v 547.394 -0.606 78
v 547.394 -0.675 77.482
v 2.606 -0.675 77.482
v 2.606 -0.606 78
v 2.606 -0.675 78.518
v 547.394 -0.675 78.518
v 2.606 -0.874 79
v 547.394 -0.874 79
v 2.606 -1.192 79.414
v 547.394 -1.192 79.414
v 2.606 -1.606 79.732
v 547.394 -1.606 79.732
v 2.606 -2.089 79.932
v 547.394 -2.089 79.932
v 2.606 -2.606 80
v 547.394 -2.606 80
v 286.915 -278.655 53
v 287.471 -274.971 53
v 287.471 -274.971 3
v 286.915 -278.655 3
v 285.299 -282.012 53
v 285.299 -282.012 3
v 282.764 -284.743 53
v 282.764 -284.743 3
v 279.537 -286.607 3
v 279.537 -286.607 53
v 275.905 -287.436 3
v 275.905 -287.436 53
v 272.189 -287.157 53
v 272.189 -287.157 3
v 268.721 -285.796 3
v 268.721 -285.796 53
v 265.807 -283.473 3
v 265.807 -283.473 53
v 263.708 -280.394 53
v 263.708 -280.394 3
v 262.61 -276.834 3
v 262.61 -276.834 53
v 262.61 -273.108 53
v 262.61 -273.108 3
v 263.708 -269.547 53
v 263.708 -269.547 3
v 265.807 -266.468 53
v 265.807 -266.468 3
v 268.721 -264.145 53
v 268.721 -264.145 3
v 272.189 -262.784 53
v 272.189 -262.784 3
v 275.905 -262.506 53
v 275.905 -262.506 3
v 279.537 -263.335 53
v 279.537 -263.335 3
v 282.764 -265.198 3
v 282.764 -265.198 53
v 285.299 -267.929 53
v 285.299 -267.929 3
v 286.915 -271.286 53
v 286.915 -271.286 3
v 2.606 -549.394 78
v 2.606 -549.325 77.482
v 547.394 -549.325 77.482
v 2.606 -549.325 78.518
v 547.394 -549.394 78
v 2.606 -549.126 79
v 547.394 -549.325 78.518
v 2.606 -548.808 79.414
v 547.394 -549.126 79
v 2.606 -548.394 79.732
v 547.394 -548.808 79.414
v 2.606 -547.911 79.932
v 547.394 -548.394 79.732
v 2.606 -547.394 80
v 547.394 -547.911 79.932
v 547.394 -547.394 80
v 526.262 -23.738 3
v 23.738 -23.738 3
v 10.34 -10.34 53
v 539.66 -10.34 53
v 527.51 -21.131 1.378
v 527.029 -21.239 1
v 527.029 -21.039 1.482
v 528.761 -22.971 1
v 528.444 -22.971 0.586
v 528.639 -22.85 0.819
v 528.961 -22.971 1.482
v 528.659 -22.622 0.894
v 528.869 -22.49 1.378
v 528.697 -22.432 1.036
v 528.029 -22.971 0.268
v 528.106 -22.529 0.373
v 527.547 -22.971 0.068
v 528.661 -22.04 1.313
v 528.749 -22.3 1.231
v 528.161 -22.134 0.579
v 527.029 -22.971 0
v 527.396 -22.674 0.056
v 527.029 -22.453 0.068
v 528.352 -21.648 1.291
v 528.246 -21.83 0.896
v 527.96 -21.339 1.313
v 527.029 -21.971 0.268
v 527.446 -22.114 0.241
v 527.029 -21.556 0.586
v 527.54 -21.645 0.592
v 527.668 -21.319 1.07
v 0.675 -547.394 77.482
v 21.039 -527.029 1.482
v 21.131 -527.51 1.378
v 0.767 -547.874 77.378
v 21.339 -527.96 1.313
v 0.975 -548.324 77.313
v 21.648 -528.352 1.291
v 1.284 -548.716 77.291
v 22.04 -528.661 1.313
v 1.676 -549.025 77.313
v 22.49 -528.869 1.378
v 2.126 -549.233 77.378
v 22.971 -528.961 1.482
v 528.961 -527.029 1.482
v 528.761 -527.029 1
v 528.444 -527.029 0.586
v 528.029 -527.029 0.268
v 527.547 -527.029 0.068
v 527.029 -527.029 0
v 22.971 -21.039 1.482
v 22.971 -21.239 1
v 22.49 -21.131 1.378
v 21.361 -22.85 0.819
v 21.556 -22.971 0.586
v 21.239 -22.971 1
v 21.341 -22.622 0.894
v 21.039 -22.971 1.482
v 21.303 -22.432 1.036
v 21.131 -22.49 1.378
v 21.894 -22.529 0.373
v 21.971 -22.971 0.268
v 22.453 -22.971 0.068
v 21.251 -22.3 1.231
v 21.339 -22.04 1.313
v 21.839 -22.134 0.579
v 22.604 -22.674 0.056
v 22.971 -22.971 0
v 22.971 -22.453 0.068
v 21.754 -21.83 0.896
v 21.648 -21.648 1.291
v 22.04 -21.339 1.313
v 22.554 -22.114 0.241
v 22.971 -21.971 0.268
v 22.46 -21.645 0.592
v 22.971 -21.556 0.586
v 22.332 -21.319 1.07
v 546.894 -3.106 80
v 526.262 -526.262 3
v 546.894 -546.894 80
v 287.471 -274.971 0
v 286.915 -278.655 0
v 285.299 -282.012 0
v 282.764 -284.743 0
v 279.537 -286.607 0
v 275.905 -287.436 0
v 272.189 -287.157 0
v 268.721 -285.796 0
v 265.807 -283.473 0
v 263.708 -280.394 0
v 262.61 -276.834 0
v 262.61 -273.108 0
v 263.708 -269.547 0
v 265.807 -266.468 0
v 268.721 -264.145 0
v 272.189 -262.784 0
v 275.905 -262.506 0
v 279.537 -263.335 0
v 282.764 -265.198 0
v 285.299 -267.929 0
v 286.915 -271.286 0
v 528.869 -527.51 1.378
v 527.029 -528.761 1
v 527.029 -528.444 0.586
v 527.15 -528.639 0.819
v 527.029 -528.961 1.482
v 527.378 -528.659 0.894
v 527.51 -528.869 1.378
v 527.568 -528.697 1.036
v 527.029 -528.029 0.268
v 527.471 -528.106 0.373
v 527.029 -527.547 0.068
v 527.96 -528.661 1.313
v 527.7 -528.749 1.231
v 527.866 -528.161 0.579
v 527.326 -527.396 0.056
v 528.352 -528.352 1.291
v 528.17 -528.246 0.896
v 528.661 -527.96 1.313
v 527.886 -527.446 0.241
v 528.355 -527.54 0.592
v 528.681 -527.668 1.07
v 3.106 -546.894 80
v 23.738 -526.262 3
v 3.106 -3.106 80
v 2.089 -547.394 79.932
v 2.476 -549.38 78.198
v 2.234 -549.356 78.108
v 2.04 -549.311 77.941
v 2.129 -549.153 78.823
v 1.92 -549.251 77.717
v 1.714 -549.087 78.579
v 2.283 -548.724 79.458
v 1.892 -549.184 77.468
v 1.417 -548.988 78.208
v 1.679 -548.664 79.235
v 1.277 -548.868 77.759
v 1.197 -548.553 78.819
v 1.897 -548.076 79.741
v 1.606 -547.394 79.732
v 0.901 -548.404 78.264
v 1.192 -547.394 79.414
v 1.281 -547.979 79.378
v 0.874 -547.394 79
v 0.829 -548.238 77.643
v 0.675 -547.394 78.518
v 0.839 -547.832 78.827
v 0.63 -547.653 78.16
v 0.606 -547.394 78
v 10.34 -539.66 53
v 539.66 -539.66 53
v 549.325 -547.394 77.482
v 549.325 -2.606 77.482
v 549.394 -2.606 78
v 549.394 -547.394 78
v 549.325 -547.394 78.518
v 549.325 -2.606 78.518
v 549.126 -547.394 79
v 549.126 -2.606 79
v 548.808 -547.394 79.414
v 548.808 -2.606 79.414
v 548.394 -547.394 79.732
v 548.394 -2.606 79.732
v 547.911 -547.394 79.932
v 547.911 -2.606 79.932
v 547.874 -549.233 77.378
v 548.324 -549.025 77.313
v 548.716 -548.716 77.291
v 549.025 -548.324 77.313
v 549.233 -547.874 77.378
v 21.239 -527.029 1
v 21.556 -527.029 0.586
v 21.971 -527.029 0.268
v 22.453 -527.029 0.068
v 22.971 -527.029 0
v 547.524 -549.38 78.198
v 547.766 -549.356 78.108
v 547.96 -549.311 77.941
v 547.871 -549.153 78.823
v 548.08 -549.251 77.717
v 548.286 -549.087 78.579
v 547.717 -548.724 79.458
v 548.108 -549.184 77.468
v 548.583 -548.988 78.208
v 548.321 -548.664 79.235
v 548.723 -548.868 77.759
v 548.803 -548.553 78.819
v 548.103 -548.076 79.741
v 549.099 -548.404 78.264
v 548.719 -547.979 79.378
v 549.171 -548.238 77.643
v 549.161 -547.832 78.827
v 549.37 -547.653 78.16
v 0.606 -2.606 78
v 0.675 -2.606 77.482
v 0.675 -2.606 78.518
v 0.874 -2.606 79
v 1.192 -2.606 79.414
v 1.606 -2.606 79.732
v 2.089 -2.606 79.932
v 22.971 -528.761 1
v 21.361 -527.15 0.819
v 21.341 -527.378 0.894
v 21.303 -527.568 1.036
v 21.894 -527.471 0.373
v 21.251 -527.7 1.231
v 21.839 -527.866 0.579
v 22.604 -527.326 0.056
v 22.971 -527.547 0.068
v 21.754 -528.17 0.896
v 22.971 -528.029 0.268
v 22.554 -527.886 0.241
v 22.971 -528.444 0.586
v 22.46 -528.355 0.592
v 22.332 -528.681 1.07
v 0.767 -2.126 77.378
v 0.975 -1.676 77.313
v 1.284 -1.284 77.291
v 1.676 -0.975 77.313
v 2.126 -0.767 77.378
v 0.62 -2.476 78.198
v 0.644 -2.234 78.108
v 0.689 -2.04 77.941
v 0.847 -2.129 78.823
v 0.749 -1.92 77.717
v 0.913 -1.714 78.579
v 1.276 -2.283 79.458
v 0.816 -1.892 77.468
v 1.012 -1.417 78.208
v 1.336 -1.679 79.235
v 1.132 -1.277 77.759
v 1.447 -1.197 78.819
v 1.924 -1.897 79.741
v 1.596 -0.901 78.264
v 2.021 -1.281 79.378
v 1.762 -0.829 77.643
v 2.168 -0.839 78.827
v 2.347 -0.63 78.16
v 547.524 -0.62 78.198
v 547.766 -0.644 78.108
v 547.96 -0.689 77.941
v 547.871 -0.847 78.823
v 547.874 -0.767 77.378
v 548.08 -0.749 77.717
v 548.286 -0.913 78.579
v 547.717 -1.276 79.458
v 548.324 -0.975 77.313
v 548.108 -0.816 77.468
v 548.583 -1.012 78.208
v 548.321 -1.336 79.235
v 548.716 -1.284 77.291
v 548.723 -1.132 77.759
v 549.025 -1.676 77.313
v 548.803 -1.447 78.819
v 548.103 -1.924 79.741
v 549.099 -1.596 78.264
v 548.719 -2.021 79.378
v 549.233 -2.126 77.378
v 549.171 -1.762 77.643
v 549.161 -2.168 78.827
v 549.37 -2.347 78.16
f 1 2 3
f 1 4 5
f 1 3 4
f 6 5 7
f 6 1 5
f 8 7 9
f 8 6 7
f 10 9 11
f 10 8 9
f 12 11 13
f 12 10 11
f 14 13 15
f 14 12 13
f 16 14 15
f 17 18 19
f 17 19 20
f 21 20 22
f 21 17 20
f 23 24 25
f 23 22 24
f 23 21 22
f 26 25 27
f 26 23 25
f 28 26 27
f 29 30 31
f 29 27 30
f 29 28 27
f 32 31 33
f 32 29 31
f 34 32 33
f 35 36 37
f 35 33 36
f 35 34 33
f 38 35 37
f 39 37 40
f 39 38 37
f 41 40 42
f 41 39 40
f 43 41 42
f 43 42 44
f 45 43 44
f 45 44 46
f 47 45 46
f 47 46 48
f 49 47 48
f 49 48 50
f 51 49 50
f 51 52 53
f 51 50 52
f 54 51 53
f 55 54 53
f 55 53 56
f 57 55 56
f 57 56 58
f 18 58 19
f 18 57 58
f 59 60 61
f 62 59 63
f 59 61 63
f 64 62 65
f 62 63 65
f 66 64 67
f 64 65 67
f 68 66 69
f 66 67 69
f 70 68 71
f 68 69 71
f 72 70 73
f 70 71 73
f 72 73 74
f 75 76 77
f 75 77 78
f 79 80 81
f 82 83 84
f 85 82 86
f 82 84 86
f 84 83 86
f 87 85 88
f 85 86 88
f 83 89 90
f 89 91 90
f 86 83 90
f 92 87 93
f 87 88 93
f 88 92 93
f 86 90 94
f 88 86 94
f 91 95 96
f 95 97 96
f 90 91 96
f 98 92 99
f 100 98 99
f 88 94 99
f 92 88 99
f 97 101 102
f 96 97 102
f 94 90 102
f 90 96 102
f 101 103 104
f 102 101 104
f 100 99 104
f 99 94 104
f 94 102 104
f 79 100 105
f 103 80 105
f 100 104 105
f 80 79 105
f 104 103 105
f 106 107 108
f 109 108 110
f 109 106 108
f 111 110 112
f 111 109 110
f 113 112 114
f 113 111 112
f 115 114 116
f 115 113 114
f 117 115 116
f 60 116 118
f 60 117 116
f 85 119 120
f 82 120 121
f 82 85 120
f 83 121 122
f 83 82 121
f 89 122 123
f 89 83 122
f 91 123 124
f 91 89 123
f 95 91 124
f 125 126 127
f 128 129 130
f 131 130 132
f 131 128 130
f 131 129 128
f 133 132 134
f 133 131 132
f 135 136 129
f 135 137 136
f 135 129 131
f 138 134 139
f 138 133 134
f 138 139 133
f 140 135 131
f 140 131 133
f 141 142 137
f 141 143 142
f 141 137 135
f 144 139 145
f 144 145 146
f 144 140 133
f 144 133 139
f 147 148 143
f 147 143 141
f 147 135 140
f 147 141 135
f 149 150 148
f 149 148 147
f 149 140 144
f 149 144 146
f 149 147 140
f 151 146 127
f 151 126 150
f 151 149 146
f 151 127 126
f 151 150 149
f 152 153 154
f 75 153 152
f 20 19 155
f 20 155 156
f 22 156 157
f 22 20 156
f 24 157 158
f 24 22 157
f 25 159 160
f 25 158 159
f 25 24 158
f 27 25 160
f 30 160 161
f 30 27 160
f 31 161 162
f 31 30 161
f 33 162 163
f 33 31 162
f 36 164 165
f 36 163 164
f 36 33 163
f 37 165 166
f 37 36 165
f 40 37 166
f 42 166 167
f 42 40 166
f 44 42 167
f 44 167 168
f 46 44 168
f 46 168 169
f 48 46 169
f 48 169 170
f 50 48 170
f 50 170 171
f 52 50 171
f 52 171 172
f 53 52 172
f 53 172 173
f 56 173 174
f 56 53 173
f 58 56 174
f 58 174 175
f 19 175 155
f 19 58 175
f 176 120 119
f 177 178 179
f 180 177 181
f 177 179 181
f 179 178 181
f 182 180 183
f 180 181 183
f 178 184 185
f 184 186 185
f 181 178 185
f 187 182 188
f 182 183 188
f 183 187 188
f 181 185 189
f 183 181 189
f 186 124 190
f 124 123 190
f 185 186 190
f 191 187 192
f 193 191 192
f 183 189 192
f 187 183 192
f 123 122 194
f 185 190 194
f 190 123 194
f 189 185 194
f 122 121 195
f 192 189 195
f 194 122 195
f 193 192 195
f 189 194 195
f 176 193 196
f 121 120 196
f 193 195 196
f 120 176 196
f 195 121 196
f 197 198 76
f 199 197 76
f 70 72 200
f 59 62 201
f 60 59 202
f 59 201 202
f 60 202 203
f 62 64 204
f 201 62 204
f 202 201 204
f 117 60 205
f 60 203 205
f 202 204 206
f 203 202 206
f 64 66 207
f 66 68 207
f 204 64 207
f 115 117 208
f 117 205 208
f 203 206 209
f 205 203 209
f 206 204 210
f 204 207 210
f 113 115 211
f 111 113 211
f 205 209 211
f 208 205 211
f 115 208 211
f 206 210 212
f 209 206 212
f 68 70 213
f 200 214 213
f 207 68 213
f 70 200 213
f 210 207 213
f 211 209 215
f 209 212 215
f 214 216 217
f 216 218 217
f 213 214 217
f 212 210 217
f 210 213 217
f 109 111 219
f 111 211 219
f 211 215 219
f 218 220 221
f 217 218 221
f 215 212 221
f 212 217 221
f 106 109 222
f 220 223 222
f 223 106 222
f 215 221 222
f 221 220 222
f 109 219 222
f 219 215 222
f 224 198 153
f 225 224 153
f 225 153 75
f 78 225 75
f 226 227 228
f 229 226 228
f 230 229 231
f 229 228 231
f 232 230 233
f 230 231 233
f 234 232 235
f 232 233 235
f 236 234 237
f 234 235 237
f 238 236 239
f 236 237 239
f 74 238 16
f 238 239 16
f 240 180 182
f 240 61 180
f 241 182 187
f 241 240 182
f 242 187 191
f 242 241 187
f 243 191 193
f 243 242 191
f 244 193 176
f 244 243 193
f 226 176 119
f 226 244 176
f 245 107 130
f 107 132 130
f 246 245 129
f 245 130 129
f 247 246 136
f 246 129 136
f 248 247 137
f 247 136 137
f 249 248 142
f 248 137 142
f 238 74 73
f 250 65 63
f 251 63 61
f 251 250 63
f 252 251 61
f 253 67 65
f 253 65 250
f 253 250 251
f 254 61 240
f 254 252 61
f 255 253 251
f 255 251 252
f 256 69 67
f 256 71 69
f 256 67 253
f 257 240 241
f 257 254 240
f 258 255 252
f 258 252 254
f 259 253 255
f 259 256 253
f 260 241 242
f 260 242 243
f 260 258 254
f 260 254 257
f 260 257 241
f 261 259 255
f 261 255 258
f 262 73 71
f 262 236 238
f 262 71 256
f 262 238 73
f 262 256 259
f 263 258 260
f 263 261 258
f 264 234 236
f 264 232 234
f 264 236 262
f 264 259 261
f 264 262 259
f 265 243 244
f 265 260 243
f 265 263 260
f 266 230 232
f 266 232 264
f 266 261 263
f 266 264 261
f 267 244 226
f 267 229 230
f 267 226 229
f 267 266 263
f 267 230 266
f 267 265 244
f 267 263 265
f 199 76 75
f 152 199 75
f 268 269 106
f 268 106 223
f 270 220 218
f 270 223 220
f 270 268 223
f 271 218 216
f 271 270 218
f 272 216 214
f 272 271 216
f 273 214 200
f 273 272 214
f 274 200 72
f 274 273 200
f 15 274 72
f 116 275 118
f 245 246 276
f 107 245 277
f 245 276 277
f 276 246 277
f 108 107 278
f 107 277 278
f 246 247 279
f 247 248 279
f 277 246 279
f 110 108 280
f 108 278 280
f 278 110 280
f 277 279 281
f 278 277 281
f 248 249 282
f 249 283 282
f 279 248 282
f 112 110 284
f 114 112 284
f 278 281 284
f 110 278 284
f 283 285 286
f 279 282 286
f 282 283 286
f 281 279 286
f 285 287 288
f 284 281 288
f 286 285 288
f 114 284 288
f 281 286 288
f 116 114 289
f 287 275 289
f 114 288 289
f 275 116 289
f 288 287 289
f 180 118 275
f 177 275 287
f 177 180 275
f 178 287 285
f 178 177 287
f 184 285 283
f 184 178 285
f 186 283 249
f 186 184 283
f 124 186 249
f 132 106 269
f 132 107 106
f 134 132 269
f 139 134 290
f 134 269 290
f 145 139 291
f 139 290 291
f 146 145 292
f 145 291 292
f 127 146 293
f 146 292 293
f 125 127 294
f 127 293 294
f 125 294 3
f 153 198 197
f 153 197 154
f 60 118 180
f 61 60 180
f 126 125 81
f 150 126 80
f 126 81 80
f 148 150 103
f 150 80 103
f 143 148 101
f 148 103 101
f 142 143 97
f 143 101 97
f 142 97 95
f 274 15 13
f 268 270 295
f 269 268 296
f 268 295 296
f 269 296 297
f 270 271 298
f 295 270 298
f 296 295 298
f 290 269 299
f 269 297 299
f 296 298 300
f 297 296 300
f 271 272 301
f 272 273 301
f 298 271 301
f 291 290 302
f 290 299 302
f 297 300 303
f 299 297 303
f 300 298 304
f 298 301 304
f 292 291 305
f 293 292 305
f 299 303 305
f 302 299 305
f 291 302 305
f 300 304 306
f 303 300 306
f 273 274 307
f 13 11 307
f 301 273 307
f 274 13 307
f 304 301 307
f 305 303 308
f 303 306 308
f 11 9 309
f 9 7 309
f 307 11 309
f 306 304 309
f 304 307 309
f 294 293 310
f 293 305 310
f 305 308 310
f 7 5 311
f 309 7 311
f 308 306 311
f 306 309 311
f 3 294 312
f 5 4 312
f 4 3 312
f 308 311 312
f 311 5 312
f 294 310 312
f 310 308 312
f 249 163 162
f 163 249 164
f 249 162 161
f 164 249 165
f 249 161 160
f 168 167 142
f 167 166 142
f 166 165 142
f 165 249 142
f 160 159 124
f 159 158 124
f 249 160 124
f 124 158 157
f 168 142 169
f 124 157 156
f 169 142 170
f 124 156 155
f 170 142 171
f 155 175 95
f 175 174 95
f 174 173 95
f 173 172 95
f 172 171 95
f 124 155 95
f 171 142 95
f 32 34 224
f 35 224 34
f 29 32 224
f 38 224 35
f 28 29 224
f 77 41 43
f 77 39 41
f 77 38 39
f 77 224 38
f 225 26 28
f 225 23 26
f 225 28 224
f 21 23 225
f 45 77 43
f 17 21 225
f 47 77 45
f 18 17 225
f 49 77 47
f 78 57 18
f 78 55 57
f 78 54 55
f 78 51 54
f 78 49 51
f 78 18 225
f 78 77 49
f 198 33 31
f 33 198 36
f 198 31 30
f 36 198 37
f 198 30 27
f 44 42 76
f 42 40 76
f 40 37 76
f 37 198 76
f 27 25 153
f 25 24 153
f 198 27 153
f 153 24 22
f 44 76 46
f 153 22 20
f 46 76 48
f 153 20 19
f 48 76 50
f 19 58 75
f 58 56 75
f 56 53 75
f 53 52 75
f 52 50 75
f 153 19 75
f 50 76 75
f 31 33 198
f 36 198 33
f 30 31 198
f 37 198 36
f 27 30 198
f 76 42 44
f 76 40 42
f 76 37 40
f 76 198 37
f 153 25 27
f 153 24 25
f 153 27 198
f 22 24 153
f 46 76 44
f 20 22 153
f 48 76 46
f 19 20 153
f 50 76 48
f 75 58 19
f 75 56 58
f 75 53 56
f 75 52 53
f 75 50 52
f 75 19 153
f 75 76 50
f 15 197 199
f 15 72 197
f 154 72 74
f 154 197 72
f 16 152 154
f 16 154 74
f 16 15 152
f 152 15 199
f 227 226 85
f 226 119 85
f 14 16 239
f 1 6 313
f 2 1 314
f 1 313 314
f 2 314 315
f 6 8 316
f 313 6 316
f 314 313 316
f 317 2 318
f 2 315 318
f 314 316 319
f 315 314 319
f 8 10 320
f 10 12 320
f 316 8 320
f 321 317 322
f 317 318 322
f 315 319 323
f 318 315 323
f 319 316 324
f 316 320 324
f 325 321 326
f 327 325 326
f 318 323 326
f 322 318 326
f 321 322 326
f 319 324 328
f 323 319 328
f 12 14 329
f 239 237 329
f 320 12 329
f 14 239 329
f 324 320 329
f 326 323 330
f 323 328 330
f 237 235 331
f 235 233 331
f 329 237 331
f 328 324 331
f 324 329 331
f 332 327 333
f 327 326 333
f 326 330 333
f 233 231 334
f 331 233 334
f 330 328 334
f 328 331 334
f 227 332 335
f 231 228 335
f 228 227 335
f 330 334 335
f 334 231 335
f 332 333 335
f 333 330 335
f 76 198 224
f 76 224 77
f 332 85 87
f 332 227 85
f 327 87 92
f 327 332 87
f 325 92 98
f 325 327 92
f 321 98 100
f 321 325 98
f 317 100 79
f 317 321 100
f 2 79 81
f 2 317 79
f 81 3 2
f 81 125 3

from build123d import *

# Parameters (mm, degrees)
SKETCH_1_W               = 550
SKETCH_1_H               = 550
EXTRUDE_1_DEPTH          = 80
DRAFT_3_ANGLE            = -15
FILLET_1_R               = 2
SHELL_8_OUTLINE_W        = 502.524167284
SHELL_8_OUTLINE_H        = 502.524167284
SHELL_8_DEPTH            = 77
SHELL_8_DRAFT            = -15
SKETCH_4_W               = 502.524167284
SKETCH_4_H               = 502.524167284
EXTRUDE_3_DEPTH          = 50
EXTRUDE_3_DRAFT          = -15
CUT_EXTRUDE_1_DEPTH      = 782.067566811
CUT_EXTRUDE_1_DEPTH_BACK = 782.067566811
SKETCH_5_R               = 12.5


# Read off the part's stored shape, not the designer's step: 쉘8
with BuildPart() as part:
    # 스케치1 → 보스-돌출1 (new body)
    with BuildSketch(Plane.XY):
        with Locations((275, -275)):
            Rectangle(SKETCH_1_W, SKETCH_1_H)
    extrude(amount=EXTRUDE_1_DEPTH)

    # 구배3
    draft_3_faces = [part.faces().sort_by_distance(p)[0] for p in [
        (550, -275, 40),
        (275, -550, 40),
        (0, -275, 40),
        (275, 0, 40),
    ]]
    draft(draft_3_faces, Plane.XY.offset(80), DRAFT_3_ANGLE)

    # 필렛1
    fillet_1_edges = [part.edges().sort_by_distance(p)[0] for p in [
        (550, -275, 80),
        (275, 0, 80),
        (0, -275, 80),
        (275, -21.435935394, 0),
        (528.564064606, -275, 0),
        (275, -528.564064606, 0),
        (21.435935394, -275, 0),
        (275, -550, 80),
        (10.717967697, -10.717967697, 40),
        (539.282032303, -10.717967697, 40),
        (539.282032303, -539.282032303, 40),
        (10.717967697, -539.282032303, 40),
    ]]
    fillet(fillet_1_edges, radius=FILLET_1_R)


with BuildPart() as shell_8_tool:
    # 쉘8 outline → 쉘8 (with draft: the straight prism first)
    with BuildSketch(Plane.XY.offset(3)):
        with Locations((275, -275)):
            Rectangle(SHELL_8_OUTLINE_W, SHELL_8_OUTLINE_H)
    extrude(amount=SHELL_8_DEPTH)
    # 쉘8: the draft: its side faces are tilted about the plane it starts from
    shell_8_sides = [shell_8_tool.faces().sort_by_distance(p)[0] for p in [
        (275, -526.262083642, 41.5),
        (526.262083642, -275, 41.5),
        (275, -23.737916358, 41.5),
        (23.737916358, -275, 41.5),
    ]]
    draft(shell_8_sides, Plane.XY.offset(3), SHELL_8_DRAFT)


with BuildPart() as part_1:
    add(part.part)

    # 쉘8: cut by shell_8_tool
    add(shell_8_tool.part, mode=Mode.SUBTRACT)


with BuildPart() as body_2:
    # 스케치4 → 보스-돌출3 (with draft: the straight prism first)
    with BuildSketch(Plane.XY.offset(3)):
        with Locations((275, -275)):
            Rectangle(SKETCH_4_W, SKETCH_4_H)
    extrude(amount=EXTRUDE_3_DEPTH)
    # 보스-돌출3: the draft: its side faces are tilted about the plane it starts from
    extrude_3_sides = [body_2.faces().sort_by_distance(p)[0] for p in [
        (526.262083642, -275, 28),
        (275, -23.737916358, 28),
        (23.737916358, -275, 28),
        (275, -526.262083642, 28),
    ]]
    draft(extrude_3_sides, Plane.XY.offset(3), EXTRUDE_3_DRAFT)


with BuildPart() as cut_extrude_1_tool:
    # 스케치5 → 컷-돌출1 (new, two sides: drawn at the far end of the back side and taken through both)
    with BuildSketch(Plane(origin=(0, 0, 0), x_dir=(-1, 0, 0), z_dir=(0, 0, -1)).offset(-CUT_EXTRUDE_1_DEPTH_BACK)):
        with Locations(Location((-274.97058937, -274.97058937, 0), (0, 0, 180))):
            Circle(SKETCH_5_R)
    extrude(amount=CUT_EXTRUDE_1_DEPTH + CUT_EXTRUDE_1_DEPTH_BACK)


with BuildPart() as part_2:
    add(part_1.part)

    # 컷-돌출1: cut by cut_extrude_1_tool
    add(cut_extrude_1_tool.part, mode=Mode.SUBTRACT)


with BuildPart() as body_2_1:
    add(body_2.part)

    # 컷-돌출1: cut by cut_extrude_1_tool
    add(cut_extrude_1_tool.part, mode=Mode.SUBTRACT)


solid = Compound([part_2.part, body_2_1.part])
